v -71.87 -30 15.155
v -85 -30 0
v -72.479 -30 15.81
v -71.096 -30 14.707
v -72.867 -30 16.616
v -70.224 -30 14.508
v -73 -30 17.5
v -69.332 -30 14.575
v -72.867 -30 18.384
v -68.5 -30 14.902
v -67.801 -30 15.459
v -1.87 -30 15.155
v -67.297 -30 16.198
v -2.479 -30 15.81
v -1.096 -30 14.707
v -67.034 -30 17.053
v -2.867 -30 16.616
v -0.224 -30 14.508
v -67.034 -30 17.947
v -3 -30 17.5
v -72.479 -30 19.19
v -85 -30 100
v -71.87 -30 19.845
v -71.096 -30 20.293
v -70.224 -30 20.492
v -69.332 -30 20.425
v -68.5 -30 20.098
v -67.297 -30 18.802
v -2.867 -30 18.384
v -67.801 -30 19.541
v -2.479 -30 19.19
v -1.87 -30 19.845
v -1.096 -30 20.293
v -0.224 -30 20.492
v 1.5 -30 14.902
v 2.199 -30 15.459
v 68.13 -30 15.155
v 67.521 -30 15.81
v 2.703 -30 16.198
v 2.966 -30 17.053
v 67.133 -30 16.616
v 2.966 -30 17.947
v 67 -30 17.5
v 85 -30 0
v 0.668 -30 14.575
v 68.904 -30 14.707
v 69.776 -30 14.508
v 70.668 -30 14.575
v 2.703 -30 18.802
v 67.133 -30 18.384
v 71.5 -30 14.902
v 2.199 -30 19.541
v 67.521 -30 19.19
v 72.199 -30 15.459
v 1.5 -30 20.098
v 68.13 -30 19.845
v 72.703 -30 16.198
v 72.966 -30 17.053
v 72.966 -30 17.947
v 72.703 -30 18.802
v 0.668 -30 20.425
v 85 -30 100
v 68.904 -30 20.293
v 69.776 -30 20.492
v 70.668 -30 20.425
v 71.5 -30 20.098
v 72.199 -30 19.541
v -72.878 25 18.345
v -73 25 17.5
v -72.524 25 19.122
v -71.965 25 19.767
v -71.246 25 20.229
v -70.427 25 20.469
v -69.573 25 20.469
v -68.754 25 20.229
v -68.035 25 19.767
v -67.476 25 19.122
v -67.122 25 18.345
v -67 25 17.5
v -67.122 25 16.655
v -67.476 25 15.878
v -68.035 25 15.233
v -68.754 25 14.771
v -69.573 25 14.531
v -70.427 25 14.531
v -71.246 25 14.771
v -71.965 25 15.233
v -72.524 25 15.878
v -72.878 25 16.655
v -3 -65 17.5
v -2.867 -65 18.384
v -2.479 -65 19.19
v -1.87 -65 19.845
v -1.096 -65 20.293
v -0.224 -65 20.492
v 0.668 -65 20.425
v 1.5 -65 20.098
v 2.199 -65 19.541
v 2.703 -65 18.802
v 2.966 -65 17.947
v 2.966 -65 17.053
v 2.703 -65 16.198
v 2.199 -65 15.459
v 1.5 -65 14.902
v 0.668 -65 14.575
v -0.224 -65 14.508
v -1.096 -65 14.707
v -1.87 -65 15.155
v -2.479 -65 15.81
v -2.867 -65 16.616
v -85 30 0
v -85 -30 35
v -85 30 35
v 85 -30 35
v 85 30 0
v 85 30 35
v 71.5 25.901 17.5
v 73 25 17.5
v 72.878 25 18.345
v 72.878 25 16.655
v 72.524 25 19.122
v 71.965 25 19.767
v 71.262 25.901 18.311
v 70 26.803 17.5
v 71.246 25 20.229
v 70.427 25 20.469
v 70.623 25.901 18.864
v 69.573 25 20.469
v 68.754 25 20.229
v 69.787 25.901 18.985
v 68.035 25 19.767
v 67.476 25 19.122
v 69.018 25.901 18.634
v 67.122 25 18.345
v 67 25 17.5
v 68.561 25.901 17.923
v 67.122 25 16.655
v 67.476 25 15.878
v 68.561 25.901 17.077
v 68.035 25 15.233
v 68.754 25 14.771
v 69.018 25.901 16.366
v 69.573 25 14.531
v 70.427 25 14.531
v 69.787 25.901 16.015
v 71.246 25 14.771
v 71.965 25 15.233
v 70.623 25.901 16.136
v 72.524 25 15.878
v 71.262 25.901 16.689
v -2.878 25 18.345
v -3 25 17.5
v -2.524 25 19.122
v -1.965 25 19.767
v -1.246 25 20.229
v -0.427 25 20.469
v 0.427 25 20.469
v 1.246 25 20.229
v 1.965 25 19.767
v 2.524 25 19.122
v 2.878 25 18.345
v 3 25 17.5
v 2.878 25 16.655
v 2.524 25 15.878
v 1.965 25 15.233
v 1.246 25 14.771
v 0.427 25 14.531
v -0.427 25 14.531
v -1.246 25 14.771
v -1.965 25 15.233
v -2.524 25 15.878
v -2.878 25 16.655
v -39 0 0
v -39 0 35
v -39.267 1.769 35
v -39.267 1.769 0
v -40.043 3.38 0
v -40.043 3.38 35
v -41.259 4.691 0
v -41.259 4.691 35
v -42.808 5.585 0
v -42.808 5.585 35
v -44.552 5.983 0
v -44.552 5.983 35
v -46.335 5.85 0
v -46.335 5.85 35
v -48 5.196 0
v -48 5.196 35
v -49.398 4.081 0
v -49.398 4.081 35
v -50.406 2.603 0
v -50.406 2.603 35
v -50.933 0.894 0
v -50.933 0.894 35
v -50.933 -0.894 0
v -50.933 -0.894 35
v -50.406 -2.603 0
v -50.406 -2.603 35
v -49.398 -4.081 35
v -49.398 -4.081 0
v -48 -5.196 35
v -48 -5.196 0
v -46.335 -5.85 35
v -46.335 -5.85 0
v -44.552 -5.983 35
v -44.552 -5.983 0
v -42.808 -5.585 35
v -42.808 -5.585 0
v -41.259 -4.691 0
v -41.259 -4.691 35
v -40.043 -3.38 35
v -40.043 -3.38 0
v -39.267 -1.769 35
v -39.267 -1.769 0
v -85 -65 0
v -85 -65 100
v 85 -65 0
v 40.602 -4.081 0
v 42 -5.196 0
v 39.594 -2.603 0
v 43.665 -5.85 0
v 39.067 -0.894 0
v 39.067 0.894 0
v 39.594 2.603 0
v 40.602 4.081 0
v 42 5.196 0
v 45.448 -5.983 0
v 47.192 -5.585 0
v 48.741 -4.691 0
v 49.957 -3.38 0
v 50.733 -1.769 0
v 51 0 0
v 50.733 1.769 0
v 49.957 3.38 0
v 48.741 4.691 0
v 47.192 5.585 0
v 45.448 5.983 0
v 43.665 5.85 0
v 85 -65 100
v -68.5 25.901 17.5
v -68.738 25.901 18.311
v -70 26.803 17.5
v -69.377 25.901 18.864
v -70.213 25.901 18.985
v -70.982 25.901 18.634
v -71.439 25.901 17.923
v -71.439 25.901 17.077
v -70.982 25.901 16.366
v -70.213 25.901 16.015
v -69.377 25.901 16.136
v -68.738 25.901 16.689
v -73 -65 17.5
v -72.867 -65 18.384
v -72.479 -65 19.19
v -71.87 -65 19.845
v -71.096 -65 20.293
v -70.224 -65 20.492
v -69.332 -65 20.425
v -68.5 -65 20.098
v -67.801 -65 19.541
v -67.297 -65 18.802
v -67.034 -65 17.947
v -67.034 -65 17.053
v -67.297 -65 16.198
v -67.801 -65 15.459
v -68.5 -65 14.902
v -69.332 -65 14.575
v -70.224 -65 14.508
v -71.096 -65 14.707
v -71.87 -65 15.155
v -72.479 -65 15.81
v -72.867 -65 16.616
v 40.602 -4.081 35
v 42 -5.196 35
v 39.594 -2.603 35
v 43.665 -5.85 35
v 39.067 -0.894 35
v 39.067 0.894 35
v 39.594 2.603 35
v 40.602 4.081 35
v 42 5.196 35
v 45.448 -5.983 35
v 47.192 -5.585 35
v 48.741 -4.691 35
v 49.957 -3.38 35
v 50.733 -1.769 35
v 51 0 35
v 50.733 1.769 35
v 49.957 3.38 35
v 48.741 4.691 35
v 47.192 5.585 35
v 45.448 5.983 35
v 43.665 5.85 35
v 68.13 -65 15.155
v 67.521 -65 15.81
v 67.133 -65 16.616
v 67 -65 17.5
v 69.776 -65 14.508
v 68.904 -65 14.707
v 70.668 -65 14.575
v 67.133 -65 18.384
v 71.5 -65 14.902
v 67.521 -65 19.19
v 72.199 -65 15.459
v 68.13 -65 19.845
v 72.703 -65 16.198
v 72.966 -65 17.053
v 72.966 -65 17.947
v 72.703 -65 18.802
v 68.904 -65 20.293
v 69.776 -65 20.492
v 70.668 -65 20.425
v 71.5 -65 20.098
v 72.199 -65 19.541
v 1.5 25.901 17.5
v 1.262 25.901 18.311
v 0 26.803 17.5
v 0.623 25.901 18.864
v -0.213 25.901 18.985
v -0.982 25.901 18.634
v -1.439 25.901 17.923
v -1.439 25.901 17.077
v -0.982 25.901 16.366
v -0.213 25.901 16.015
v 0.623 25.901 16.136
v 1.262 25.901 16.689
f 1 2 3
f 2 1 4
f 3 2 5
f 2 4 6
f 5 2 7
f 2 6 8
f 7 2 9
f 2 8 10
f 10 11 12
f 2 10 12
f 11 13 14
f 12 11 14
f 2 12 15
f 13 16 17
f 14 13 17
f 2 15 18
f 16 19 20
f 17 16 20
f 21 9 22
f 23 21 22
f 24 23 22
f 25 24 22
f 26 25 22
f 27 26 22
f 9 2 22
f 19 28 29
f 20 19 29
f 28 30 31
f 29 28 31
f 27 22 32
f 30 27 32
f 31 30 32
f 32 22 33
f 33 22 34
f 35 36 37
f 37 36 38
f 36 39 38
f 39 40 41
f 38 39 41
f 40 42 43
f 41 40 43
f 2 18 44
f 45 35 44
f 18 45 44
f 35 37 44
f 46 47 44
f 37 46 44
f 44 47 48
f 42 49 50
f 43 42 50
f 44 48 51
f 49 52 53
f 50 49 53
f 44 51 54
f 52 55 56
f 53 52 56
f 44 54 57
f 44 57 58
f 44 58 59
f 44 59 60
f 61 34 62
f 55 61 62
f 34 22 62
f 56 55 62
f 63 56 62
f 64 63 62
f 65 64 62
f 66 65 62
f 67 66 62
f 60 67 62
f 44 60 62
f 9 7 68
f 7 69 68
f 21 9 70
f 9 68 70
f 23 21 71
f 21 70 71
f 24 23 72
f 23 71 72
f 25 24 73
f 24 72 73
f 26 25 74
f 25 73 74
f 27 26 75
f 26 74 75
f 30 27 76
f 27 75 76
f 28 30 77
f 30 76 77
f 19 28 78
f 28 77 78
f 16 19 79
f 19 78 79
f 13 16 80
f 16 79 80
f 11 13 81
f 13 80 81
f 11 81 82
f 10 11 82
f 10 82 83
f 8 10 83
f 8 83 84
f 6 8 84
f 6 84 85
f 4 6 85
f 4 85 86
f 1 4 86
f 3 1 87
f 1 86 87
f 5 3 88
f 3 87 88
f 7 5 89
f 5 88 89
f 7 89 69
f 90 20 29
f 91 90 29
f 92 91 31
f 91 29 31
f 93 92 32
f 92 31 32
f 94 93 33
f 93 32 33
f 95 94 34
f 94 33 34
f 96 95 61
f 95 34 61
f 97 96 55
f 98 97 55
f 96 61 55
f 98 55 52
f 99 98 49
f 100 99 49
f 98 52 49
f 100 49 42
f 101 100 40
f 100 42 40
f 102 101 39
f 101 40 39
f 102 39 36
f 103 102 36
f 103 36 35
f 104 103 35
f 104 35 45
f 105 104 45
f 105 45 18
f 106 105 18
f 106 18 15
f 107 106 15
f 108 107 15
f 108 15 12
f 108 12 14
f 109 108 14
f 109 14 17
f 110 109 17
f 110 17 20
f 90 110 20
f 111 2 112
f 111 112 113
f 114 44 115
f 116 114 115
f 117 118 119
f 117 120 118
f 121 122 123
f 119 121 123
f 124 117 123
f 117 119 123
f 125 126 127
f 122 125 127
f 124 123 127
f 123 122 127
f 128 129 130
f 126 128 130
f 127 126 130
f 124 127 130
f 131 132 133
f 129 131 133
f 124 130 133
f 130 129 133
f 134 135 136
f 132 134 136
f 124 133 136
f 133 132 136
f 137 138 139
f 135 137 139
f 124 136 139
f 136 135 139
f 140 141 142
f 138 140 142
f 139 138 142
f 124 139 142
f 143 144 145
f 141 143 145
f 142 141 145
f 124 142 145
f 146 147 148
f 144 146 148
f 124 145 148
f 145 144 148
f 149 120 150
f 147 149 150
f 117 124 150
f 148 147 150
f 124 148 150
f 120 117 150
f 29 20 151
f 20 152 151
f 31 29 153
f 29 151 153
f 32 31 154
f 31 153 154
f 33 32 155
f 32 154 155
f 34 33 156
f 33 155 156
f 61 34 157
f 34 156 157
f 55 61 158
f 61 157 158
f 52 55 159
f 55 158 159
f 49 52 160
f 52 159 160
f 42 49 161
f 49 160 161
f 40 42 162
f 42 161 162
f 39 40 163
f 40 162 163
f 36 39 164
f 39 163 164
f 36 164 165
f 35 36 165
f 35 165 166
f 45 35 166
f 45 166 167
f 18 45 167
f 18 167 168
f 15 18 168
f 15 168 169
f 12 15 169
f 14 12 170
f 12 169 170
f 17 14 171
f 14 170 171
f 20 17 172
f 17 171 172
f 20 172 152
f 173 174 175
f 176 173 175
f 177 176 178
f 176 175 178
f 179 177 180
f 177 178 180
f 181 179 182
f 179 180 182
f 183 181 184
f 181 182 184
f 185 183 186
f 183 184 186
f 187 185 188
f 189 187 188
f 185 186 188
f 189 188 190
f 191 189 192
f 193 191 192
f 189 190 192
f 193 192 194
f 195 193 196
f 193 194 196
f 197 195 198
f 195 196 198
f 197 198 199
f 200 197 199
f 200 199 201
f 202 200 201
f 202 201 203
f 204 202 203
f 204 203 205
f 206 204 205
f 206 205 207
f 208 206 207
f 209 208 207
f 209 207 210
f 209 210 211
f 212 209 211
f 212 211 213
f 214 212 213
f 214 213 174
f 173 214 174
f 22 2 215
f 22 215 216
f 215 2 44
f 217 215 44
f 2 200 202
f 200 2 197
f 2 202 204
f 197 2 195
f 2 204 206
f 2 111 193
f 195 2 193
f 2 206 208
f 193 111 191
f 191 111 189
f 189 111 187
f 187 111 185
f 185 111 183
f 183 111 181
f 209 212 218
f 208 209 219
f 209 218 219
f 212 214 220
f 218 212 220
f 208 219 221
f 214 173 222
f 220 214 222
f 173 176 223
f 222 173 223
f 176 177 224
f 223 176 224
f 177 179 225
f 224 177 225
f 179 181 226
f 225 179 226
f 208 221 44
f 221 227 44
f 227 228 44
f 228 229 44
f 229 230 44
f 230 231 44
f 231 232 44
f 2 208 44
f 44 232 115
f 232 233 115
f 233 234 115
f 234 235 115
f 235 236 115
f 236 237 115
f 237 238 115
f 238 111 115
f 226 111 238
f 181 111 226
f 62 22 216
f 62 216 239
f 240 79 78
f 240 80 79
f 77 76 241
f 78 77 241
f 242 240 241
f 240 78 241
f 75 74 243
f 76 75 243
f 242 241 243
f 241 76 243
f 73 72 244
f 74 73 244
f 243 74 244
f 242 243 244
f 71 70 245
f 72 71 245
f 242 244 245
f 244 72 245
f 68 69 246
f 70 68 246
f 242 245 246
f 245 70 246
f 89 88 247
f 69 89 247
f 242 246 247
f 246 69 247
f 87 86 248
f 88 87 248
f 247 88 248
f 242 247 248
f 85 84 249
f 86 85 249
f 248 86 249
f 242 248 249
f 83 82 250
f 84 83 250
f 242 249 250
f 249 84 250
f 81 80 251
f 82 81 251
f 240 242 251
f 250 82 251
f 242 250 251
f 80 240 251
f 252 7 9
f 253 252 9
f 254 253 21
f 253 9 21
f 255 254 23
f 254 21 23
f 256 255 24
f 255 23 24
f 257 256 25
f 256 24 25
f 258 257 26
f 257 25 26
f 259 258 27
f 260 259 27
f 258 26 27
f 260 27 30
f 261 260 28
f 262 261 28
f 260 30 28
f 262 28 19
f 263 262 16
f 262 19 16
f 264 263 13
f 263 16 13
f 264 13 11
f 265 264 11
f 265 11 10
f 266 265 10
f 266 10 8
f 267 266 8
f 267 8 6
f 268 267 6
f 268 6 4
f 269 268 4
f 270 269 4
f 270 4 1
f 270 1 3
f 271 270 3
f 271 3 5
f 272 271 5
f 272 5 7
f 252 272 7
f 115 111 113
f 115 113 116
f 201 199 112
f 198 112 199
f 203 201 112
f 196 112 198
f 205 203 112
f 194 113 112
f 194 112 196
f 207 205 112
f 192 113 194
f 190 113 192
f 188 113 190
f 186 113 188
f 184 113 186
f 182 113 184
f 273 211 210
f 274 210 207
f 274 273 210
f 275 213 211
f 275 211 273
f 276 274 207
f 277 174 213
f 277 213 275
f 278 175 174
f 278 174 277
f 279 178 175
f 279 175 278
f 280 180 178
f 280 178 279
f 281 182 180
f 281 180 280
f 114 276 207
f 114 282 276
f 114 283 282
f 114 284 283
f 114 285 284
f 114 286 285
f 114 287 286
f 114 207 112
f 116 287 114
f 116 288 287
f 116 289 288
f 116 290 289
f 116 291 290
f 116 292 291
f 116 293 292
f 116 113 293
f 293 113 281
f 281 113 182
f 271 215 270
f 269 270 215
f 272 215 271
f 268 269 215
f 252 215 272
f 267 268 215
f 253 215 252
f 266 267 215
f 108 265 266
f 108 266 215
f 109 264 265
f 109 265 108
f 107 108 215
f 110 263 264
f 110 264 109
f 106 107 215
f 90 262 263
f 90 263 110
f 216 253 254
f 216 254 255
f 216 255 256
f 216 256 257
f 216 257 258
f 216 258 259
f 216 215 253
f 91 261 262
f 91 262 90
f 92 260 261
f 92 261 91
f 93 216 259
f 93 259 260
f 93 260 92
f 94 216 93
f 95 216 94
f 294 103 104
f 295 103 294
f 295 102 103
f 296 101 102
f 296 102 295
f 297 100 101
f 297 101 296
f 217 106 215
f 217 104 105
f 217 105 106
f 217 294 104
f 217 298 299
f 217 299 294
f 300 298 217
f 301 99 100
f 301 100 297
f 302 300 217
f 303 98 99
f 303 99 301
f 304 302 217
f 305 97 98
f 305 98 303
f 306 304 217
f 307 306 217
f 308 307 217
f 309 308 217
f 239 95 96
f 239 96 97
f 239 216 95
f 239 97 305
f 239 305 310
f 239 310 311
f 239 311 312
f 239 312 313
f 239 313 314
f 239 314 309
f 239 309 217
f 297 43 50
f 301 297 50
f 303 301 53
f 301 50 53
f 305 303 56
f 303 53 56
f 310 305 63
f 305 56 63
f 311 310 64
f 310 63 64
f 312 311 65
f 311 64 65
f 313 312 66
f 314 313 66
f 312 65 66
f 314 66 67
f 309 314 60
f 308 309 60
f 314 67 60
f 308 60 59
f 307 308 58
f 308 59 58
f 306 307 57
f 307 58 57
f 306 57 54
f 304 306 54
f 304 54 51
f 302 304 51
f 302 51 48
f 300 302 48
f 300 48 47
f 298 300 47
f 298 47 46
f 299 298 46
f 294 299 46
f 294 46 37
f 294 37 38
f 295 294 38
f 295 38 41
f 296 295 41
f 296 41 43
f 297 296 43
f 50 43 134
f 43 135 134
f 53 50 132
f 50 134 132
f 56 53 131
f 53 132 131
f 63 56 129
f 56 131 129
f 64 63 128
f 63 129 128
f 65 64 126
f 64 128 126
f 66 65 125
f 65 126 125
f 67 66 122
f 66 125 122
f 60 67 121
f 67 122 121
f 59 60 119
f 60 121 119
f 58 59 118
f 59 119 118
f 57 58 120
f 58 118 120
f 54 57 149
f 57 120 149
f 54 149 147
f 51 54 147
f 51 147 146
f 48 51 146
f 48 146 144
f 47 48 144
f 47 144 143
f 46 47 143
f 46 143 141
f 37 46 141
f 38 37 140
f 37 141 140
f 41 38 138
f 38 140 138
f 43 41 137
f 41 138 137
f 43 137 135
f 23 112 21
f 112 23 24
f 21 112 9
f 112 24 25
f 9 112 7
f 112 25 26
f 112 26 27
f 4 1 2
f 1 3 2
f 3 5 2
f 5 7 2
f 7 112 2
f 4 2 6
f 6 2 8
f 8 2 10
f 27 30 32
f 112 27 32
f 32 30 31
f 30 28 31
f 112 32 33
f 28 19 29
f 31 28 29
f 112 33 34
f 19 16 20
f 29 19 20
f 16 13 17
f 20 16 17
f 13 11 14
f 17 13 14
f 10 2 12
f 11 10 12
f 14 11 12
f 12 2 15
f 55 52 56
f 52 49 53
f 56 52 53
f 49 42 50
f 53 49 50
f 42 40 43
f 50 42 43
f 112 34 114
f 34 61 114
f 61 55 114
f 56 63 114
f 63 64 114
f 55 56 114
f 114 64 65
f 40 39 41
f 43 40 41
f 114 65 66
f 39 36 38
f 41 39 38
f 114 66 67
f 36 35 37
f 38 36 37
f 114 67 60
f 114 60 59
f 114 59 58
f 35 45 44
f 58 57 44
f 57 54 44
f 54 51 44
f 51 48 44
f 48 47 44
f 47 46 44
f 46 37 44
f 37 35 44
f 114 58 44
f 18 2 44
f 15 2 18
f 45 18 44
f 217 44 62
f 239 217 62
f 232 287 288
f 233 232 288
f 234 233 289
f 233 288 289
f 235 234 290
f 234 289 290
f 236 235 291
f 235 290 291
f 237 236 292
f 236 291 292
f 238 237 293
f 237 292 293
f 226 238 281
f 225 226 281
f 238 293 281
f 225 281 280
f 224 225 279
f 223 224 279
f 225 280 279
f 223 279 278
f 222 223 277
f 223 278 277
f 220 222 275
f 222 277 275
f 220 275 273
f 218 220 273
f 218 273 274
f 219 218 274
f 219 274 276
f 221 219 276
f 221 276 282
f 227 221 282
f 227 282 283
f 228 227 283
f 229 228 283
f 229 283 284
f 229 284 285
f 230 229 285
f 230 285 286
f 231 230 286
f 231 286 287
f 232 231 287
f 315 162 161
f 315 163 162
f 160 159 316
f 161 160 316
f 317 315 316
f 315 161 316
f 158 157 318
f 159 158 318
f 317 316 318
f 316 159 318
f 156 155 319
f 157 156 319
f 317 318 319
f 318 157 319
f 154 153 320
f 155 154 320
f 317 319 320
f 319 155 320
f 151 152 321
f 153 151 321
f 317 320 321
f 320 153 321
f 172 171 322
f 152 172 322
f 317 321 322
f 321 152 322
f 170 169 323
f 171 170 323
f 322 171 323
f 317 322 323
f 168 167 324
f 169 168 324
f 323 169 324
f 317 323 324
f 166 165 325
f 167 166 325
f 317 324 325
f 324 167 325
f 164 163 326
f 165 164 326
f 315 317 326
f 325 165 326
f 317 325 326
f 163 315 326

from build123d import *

# Parameters (mm, degrees)
F0_W       = 170
F0_H       = 60
F1_DEPTH   = 35
F2_W       = 170
F2_H       = 100
F3_DEPTH   = 35
F4_R       = 6
F5_DEPTH   = 35.001
F7_D       = 6
F7_DEPTH   = 90
F7_TIP     = 1.8025818571
F7_2_D     = 6
F7_2_DEPTH = 90
F7_2_TIP   = 1.8025818571


with BuildPart() as f1:
    # F0 (on Top) → F1 (new body)
    with BuildSketch(Plane.XY):
        Rectangle(F0_W, F0_H)
    extrude(amount=F1_DEPTH)

    # F4 (on face) → F5 (cut, through all)
    with BuildSketch(Plane.XY.offset(35)):
        with Locations((45, 0)):
            Circle(F4_R)
        with Locations((-45, 0)):
            Circle(F4_R)
    extrude(amount=-F5_DEPTH, mode=Mode.SUBTRACT)

    # F7
    with Locations(Plane.XZ.offset(65)):
        with Locations((-70, 17.5), (0, 17.5), (70, 17.5)):
            Hole(F7_D / 2, depth=F7_DEPTH)
            with Locations((0, 0, -(F7_DEPTH + F7_TIP / 2))):  # 118° drill point
                Cone(0, F7_D / 2, F7_TIP, mode=Mode.SUBTRACT)


with BuildPart() as f3:
    # F2 (on face) → F3 (new body)
    with BuildSketch(Plane.XZ.offset(30)):
        with Locations((0, 50)):
            Rectangle(F2_W, F2_H)
    extrude(amount=F3_DEPTH)

    # F7#2
    with Locations(Plane.XZ.offset(65)):
        with Locations((-70, 17.5), (0, 17.5), (70, 17.5)):
            Hole(F7_2_D / 2, depth=F7_2_DEPTH)
            with Locations((0, 0, -(F7_2_DEPTH + F7_2_TIP / 2))):  # 118° drill point
                Cone(0, F7_2_D / 2, F7_2_TIP, mode=Mode.SUBTRACT)


solid = Compound([f1.part, f3.part])
